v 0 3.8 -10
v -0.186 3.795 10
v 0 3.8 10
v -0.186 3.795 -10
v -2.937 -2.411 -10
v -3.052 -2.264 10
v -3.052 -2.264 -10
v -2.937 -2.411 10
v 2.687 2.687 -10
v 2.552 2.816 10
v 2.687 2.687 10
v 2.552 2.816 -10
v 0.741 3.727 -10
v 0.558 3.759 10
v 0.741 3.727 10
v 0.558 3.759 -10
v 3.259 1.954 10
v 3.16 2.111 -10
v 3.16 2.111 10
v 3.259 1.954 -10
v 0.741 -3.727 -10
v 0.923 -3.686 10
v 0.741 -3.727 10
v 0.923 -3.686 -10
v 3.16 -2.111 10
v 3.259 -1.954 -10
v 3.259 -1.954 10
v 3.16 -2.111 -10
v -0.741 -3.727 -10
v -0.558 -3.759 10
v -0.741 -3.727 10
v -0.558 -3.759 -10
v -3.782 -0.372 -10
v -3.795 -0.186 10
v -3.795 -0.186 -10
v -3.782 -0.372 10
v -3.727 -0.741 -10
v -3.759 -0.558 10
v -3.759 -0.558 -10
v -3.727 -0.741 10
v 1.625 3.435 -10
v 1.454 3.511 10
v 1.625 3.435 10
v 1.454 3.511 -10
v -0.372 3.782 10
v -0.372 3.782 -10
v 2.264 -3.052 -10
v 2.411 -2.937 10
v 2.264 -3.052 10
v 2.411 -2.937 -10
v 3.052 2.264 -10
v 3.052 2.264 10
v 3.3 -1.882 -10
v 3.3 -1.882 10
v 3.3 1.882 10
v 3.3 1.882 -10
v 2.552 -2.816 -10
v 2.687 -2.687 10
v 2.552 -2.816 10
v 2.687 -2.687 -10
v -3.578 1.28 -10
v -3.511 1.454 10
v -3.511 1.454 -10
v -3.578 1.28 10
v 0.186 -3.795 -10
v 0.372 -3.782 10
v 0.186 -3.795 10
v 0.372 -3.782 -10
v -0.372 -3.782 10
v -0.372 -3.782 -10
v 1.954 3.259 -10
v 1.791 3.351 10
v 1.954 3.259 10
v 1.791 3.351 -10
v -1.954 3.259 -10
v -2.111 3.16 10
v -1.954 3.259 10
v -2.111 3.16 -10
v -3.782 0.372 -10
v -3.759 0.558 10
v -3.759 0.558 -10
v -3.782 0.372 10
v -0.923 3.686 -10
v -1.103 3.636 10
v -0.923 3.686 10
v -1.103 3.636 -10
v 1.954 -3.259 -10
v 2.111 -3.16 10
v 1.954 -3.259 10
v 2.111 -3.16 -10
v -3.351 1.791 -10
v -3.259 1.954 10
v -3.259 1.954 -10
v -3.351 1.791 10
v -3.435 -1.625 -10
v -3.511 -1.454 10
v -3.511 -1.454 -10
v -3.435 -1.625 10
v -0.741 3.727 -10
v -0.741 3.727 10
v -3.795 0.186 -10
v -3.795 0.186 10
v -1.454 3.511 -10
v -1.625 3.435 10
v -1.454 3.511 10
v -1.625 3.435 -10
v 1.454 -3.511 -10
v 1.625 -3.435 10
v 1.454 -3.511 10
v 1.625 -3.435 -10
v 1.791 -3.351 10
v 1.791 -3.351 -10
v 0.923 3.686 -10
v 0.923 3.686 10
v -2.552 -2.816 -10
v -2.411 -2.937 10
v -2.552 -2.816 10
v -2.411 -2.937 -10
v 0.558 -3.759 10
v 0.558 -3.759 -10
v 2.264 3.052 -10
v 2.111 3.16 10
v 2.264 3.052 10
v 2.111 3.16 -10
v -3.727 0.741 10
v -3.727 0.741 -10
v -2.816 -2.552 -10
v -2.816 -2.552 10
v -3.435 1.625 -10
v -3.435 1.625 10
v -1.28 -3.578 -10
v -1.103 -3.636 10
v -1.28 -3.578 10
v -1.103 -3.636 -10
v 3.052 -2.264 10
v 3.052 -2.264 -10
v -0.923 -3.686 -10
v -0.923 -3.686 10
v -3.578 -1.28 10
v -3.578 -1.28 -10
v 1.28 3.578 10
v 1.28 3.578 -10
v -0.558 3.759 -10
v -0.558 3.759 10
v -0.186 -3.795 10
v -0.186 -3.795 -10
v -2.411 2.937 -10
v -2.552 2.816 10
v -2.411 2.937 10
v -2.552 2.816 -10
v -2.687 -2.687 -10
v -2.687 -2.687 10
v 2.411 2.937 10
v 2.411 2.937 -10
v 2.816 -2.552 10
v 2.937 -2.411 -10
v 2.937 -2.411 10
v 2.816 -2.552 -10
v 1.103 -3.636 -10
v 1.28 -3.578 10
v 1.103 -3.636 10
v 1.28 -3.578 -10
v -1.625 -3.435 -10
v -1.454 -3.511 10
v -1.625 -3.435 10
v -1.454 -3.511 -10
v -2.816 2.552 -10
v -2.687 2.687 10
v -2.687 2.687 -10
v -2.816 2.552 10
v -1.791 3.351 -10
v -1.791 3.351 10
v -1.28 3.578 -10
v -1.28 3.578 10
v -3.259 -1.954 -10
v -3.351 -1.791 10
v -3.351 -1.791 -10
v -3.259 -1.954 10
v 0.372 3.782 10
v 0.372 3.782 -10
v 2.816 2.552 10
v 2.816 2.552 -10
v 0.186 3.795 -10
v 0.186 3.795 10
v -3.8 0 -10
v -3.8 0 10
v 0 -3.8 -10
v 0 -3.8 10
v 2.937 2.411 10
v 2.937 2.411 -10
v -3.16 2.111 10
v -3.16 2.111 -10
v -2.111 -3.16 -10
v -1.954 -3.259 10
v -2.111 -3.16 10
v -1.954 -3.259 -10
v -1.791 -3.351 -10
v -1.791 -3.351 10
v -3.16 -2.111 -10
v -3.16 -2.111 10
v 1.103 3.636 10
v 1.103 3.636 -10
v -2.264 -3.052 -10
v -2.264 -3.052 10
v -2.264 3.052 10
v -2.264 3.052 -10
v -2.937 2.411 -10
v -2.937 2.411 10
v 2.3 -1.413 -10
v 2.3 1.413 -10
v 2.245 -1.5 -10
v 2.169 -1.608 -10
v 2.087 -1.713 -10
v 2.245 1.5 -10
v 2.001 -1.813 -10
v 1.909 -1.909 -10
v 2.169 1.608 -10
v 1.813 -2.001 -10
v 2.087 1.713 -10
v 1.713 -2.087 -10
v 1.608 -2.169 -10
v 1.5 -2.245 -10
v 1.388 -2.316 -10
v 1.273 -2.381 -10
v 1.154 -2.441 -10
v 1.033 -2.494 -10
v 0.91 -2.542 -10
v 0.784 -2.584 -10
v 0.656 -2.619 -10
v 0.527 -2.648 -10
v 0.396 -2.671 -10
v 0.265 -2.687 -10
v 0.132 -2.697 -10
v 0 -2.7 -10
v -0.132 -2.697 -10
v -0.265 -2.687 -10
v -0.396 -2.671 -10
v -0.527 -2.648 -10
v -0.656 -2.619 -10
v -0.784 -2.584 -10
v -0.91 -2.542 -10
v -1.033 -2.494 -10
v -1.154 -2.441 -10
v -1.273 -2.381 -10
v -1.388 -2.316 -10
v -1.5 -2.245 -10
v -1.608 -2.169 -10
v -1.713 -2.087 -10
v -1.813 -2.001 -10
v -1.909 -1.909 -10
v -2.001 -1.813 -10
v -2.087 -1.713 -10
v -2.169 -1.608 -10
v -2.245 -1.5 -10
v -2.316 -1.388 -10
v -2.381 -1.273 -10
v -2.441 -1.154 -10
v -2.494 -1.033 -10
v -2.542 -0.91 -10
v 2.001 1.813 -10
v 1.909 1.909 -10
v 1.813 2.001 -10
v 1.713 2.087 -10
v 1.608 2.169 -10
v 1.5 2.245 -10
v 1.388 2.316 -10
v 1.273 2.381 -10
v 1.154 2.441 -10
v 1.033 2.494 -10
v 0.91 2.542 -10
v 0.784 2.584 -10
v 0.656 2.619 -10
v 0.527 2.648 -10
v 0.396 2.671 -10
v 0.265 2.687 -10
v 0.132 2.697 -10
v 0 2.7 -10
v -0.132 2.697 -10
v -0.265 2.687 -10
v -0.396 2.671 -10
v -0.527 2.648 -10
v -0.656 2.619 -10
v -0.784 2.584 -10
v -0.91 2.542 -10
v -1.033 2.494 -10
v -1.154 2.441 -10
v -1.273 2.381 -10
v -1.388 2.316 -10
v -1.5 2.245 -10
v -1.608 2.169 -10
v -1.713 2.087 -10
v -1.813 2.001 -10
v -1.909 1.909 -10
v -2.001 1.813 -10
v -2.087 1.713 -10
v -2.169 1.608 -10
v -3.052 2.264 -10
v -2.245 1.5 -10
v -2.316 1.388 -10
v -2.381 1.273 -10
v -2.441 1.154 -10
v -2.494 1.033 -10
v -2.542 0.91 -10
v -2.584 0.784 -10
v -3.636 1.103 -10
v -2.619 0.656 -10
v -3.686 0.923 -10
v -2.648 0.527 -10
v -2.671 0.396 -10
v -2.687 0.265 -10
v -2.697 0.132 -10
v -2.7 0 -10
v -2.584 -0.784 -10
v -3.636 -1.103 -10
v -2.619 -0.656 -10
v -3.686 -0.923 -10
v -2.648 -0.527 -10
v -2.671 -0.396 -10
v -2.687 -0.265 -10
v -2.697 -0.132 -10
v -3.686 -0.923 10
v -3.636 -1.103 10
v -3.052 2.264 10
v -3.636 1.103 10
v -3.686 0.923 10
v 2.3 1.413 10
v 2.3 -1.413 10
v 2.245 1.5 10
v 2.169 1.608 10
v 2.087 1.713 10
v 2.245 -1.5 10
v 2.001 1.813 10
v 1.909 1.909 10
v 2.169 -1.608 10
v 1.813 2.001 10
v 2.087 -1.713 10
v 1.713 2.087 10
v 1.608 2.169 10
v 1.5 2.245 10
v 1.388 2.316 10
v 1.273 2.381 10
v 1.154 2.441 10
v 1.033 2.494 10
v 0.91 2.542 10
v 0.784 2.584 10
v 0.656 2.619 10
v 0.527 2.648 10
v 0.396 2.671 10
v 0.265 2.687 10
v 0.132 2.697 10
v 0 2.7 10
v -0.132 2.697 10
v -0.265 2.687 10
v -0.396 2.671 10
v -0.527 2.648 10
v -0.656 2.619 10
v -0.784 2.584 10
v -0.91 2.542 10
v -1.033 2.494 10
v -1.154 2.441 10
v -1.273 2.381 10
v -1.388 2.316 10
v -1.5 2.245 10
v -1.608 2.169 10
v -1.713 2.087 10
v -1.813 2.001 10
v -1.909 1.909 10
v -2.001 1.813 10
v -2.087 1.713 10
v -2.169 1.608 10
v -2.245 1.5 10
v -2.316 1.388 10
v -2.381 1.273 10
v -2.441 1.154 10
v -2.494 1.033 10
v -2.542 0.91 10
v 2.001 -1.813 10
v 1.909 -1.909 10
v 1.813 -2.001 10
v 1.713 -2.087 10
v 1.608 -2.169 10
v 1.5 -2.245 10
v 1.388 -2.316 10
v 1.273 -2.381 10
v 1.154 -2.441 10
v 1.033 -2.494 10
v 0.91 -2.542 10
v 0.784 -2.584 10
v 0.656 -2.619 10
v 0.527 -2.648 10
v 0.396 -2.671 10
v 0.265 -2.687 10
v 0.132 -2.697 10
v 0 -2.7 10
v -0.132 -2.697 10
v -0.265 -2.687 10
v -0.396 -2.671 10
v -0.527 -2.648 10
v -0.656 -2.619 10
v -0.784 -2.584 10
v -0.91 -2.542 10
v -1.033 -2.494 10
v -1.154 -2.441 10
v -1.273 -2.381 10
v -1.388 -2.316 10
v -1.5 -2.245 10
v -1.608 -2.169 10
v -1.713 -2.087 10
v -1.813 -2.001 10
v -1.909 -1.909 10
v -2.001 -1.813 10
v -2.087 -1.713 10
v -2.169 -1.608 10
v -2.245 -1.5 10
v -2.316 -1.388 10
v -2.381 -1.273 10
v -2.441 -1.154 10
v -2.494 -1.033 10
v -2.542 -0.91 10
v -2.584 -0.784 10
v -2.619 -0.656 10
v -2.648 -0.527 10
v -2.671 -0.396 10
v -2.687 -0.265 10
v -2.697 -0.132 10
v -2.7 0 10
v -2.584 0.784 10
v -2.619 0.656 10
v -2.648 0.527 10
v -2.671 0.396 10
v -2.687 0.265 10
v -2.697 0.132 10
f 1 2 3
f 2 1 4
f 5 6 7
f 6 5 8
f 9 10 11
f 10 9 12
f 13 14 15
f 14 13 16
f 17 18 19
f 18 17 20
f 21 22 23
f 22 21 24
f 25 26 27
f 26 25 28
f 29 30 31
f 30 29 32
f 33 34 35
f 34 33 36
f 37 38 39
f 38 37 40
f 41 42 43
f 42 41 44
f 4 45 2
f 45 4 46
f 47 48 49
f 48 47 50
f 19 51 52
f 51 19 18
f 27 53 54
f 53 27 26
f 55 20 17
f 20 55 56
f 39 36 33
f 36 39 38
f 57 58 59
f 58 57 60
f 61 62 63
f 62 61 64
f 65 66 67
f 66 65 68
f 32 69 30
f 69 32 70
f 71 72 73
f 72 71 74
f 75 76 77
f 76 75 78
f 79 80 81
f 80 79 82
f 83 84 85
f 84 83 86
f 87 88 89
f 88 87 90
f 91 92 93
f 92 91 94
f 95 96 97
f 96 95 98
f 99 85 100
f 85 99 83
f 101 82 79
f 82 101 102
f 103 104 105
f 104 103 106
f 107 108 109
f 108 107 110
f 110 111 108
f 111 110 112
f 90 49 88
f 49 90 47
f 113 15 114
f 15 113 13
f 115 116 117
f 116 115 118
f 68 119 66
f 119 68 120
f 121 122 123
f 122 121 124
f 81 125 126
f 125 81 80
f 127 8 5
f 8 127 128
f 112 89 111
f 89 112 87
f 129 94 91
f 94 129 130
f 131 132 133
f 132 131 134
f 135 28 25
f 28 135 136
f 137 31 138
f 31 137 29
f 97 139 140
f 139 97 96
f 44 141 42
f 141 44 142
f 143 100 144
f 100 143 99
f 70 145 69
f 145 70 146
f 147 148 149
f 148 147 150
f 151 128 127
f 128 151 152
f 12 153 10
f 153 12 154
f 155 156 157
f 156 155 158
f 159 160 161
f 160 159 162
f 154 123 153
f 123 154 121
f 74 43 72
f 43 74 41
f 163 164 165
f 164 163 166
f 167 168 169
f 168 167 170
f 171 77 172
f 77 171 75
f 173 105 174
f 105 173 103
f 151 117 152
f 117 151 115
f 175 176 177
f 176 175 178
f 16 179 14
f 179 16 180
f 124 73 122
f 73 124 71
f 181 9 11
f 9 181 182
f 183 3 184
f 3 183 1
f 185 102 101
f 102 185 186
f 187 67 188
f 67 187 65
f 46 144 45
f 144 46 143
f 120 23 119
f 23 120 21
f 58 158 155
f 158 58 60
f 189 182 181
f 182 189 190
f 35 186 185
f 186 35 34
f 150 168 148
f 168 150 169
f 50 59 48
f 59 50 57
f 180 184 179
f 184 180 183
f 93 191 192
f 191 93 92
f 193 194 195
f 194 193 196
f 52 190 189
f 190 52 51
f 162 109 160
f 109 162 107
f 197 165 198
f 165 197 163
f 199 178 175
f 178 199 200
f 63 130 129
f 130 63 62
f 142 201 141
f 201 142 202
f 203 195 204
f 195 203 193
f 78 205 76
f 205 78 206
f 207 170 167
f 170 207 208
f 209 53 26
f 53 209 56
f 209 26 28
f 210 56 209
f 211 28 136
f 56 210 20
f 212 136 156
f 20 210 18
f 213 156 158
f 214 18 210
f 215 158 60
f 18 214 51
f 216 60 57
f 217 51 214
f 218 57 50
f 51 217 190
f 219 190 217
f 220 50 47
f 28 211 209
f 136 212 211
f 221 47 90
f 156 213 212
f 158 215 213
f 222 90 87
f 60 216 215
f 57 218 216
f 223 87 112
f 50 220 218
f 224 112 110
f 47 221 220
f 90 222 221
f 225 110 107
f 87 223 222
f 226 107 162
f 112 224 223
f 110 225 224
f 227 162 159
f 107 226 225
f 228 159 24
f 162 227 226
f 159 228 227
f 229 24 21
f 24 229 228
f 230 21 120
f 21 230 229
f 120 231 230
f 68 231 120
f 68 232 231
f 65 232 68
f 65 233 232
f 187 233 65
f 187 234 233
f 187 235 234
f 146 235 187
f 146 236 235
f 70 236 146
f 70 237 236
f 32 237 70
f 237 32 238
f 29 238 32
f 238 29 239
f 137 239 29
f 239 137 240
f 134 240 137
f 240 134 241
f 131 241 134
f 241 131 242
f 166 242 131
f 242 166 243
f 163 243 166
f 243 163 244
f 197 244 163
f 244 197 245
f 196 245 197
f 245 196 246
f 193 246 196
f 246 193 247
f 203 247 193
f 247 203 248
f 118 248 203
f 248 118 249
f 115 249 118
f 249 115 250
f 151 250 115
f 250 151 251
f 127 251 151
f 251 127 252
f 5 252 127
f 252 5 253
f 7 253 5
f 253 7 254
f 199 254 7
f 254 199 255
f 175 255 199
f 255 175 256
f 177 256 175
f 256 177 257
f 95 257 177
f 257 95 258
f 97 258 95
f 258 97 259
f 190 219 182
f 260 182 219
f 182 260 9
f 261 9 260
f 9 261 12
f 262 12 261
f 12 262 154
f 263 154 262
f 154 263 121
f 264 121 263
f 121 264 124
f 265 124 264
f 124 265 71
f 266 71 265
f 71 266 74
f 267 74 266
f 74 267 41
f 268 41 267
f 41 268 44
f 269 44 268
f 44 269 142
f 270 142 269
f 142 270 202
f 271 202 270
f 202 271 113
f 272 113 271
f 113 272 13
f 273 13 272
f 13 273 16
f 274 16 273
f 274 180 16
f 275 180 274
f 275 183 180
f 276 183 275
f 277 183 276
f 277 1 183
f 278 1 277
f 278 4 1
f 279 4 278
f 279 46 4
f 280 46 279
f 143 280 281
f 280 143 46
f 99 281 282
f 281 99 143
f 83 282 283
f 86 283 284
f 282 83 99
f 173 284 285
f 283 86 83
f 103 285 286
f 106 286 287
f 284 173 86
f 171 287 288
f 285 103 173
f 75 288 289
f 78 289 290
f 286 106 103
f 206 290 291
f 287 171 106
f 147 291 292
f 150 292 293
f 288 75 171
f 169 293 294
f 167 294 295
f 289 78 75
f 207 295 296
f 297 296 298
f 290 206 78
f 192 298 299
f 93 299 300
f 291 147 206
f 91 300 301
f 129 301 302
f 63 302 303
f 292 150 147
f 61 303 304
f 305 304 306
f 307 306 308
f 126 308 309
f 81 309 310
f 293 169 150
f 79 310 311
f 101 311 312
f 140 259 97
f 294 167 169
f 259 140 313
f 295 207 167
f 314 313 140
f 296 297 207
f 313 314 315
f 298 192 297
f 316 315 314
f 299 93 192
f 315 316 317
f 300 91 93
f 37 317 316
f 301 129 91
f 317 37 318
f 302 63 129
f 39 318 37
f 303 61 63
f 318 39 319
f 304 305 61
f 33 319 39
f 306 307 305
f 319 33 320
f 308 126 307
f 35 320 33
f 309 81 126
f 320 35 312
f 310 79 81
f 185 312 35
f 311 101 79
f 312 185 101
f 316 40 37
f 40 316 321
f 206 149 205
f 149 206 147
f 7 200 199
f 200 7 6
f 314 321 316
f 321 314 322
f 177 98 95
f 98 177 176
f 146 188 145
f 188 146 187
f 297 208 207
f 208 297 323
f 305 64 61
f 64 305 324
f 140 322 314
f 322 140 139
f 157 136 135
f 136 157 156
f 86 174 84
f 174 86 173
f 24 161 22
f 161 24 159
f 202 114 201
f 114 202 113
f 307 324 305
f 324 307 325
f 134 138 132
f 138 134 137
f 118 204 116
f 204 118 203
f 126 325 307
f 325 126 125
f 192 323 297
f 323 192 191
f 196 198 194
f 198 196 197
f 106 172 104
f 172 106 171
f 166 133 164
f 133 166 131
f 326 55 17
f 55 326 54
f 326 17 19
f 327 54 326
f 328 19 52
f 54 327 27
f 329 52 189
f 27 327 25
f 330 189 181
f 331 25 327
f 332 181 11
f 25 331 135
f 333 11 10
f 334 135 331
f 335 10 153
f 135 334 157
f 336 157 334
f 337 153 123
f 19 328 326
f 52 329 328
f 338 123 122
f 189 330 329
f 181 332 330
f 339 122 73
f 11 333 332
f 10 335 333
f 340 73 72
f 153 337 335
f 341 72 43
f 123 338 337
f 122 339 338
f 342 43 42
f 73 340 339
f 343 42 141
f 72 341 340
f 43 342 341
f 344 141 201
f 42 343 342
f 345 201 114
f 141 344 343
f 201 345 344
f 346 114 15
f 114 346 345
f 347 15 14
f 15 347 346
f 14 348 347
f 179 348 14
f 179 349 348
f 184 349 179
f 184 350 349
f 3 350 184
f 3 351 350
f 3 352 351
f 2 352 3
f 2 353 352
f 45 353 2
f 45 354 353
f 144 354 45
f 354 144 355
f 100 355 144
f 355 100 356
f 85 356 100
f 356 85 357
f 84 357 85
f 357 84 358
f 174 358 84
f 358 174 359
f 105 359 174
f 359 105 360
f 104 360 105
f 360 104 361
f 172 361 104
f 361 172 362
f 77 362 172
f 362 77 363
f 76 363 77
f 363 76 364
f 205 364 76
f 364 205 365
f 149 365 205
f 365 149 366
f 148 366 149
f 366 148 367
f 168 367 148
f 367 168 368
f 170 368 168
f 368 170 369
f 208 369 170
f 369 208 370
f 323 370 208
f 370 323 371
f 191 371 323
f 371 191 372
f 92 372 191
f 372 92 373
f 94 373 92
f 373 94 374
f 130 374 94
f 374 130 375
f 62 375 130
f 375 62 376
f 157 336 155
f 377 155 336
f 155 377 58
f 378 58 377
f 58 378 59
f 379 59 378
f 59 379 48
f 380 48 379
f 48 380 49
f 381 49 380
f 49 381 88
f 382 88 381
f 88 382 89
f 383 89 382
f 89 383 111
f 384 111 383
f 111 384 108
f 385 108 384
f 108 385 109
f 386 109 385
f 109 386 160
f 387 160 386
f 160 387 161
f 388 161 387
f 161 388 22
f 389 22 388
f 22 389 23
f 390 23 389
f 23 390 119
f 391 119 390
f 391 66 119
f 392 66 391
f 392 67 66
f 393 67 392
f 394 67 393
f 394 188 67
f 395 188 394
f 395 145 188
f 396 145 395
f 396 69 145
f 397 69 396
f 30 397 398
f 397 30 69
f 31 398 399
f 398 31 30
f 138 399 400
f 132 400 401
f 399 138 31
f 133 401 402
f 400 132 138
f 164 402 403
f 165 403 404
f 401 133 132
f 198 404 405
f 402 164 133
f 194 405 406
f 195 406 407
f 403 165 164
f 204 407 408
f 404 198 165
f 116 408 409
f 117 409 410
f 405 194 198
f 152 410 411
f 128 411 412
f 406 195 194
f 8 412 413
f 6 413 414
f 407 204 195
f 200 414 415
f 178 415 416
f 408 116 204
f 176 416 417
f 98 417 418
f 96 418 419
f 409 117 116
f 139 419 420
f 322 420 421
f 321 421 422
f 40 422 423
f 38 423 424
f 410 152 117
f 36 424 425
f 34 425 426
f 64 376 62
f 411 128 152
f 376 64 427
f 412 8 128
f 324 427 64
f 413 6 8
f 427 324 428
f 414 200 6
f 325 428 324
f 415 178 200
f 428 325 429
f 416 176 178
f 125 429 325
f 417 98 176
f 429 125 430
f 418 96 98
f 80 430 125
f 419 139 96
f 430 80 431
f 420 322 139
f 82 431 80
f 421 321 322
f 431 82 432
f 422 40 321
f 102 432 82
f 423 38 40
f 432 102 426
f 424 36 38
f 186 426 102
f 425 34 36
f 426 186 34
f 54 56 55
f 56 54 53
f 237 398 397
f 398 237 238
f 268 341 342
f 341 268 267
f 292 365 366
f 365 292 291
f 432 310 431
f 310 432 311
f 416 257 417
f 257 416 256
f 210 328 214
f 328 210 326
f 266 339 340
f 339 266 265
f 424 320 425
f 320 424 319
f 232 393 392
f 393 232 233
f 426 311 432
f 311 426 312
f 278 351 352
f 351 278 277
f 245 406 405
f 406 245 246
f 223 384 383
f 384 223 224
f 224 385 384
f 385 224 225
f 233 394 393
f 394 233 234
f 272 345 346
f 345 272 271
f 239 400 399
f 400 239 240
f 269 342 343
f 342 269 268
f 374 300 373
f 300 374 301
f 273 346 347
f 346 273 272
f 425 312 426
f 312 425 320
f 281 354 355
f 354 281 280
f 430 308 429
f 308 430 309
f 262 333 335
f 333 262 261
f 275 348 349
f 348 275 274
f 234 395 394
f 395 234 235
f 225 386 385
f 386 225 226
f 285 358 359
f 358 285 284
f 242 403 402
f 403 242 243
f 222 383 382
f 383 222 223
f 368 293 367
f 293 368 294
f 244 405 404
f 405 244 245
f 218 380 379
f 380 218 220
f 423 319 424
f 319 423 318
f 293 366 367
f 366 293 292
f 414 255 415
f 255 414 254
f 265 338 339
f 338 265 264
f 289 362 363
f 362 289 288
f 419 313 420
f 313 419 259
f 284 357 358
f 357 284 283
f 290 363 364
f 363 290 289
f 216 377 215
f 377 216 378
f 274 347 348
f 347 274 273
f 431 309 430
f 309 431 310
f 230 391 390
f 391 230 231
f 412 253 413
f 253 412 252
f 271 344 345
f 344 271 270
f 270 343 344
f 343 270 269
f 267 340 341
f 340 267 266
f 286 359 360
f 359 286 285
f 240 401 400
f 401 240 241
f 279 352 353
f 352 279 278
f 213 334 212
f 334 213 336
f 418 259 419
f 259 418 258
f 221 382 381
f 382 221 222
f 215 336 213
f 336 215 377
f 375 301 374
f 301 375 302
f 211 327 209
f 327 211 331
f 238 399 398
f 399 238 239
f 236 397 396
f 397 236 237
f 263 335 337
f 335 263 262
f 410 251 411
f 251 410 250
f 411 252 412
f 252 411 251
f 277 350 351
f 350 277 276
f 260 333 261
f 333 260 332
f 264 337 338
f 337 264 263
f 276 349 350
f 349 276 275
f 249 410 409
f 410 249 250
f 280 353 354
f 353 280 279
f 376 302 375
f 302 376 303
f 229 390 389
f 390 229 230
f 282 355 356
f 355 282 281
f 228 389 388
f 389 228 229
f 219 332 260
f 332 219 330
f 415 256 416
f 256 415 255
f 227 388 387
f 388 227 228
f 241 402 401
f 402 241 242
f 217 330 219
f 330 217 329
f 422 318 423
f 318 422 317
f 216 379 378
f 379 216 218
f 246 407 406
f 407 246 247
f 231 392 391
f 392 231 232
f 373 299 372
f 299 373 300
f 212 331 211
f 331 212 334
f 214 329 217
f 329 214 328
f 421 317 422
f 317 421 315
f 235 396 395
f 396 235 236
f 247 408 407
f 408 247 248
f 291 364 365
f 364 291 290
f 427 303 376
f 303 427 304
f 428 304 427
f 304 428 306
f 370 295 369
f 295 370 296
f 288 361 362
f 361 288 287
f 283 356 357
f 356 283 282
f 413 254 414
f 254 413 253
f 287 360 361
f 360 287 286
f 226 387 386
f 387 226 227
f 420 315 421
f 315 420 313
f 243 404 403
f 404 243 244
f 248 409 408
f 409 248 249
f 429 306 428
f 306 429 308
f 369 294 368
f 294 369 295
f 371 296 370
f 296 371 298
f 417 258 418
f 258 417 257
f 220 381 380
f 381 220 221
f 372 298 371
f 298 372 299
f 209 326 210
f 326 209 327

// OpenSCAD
// file: mechanic.scad
// For mechanics only
use <base.scad>;

// Fish top with stem. Angle must be between 0 and 90.
// Female fish top - is a difference(cube, male)
// Stem - for male, Shell - for female
// Shell = [side(X), back(Y)] or scalar
module fishtop(gender = "m", size = 1, depth = 1, 
    angle = 45, length = 1, backlash = 0, stem = 0, shell = 1)
{
    if (angle >= 90 || angle <= 0) echo("Fish top: Wrong angle!");
    if (gender == "m") {
        real_size = size + 2*backlash;
        real_depth = depth + backlash;
        minor_size = size - 2*depth/tan(angle) + 2*backlash;
        union() {
            linear_extrude(height = length, center = true, scale = 1.0)
            {
                polygon(points = [[-real_size/2, backlash],
                    [-real_size/2, 0], [real_size/2, 0],
                    [real_size/2, backlash],
                    [minor_size/2, real_depth], 
                    [-minor_size/2, real_depth]]);
            }
            translate([0, real_depth + stem / 2 - 0.01, 0]) 
                cube([minor_size, stem, length], center = true);
        }
        
    } else {
        side_shell = (len(shell) > 1) ? shell[0] : shell;
        back_shell = (len(shell) > 1) ? shell[1] : shell;
        difference() {
            translate([0, depth/2 - back_shell/2, 0])
                cube([size + 2 * side_shell, 
                    depth + back_shell, length], 
                    center = true);
            fishtop(gender = "m", size = size, depth = depth, 
                angle = angle, length = length + 0.01, 
                backlash = backlash, stem = 0.1);
        }
    }
}

// Box
// You must set any two parameters. Thrid parameter is redundant.
// External, internal and shell must be a vectors.
// shell[2] (Z) - is a bottom width
module box(external = 0, internal = 0, shell = 0)
{
    ext_size = (external) ? external : internal + 
        [shell[0]*2, shell[1]*2, shell[2]];
    int_size = (internal) ? internal : external - 
        [shell[0]*2, shell[1]*2, shell[2]];
    shell_size = (shell) ? shell : 
        [(external[0] - internal[0]) / 2,
         (external[1] - internal[1]) / 2,
         external[2] - internal[2]];
    difference(){
        cube(ext_size, center = true);
        translate([0, 0, shell_size[2]/2 + 0.01])
            cube(int_size + [0, 0, 0.02], center = true);
    }
}

// Stuff for bolt and nut mount. Add it in difference
// Required parameters: l - full bolt length. d - bolt diameter, 
// Additional parameters: depth - hat and nut depth, hex - nut width, hat_d - botl hat diameter
module bolt_nut_mount(l = 10, d = 3, depth = 0, hex = 0, hat_d = 0)
{
    hat_depth = (depth == 0) ? d : depth;
    hex_depth = (depth == 0) ? d : depth;
    bolt_hat_d = (hat_d == 0) ? 2*d : hat_d;
    hex_w = (hex == 0) ? (1.7 + 5.4 / pow(d, 3)) * d : hex;
    union() {
        cylinder(d = d, h = l, center = true);
        translate([0, 0, l/2 - hat_depth/2]) cylinder(d = bolt_hat_d, h = hat_depth, center = true);
        translate([0, 0, -l/2 + hat_depth/2]) prism(h = hex_depth) hexagon(hex_w);
    }
}


// Pipe
module pipe(outer_diameter, inner_diameter, length, resolution = 0.1)
{
    $fs = resolution;
    difference() {
        cylinder(h = length, r = outer_diameter / 2, 
            center = true);
        cylinder(h = length + 0.01, r = inner_diameter / 2, 
            center = true);
    }
}

// Holder for cylinder
// n_holes - number of holes - can be scalar or [x_holes, z_holes]
module pipe_collar(cylinder_d = 10, holder_d = 5, holder_h = 10, 
    gap = 1, clamp_l = 1, clamp_w = 1, n_holes = 0, hole_d = 3, bolt_places = false)
{
    holder_shell = (holder_d - cylinder_d)/2;
    clamp_full_l = clamp_l + holder_d/2;
    hole_points_z = (len(n_holes) == undef) ? 
        [-holder_h * (n_holes/(n_holes + 1) - 1/2):
         holder_h/(n_holes + 1):
         holder_h * (n_holes/(n_holes + 1) - 1/2) + 0.01] : 
        [holder_h/2 - hole_d, -holder_h/2 + hole_d];
    difference() {
        union() {
            cylinder(r = holder_d/2, h = holder_h, center = true);
            // clamp
            translate([clamp_full_l/2, 0, 0])
                cube([clamp_full_l, clamp_w*2 + gap, holder_h], 
                    center = true);
        }
        union() {
            cylinder(r = cylinder_d/2, h = holder_h + 0.01, 
                center = true);
            // gap
            translate([holder_d/2 - (holder_shell - clamp_l)/2, 0, 0]) 
                cube([clamp_l + holder_d/2 + 0.01, gap, 
                    holder_h + 0.01], center = true);
            // holes
            for (z = hole_points_z) {
                translate([cylinder_d/2 + clamp_l/2 + holder_shell*3/4, 0, z]) 
                rotate([90, 0, 0])
                if (bolt_places) {
                    bolt_nut_mount(l = clamp_w*2 + gap + 0.01, d = hole_d);
                } else {
                    cylinder(r = hole_d/2, h = clamp_w*2 + gap + 0.01, 
                        center = true);
                }
            }
        }
    }
}

$fn = 64;
pipe_collar(cylinder_d = 16, holder_d = 20, holder_h = 10, gap = 3,
    clamp_l = 7, clamp_w = 3, n_holes = 2, hole_d = 2);
// file: base.scad
// Base function and modules for all cases

// Create [x, y, z] copies of the object 
// placed according to the step vector
module array(n_copies, step = [10,10,10], center = true)
{
    translation = (center) ? [for(i = [0:2])
            (n_copies[i] - 1) * step[i] / -2] : [0, 0, 0];
    translate(translation)
    union() {
        for (i_x = [0:n_copies[0] - 1]) {
            for (i_y = [0:n_copies[1] - 1]) {
                for (i_z = [0:n_copies[2] - 1]) {
                    translate([i_x*step[0], i_y*step[1], 
                        i_z*step[2]]) children();
                }
            }
        }
    }
}

module mirrorcp(arg) {
    children();
    mirror(arg) children();
}

module rotatecp(arg) {
    children();
    rotate(arg) children();
}

module placeclone(points) {
    union() {
        for (p = points) {
            translate(p) children();
        }
    } 
}

// cylinder with ellipse profile
module ellipse_cylinder(h = 1, rx = 1, ry = 1)
{
    scale([rx, ry, h]) cylinder(h = 1, r = 1, center = true);
}

// rectangular triangle
module rect_triangle(x = 1, y = 1)
{
    polygon(points = [[x, 0], [0, 0], [0, y]]);
}

// isosceles triangle
// set two out of three parameters
module iso_triangle(base = undef, height = undef, angle = undef)
{
    b = (base > 0) ? base : 2 * height / tan(angle);
    h = (height > 0) ? height : base * tan(angle) / 2;
    a = (angle > 0) ? angle : atan2(h, b/2);
    polygon(points = [[-b/2, 0], [0, h], [b/2, 0]]); 
}

// hexagon. Width for nut wrench.
module hexagon(width)
{
    size = width / sqrt(3);
    polygon(points = [for(a = [0:60:360]) [size*cos(a+30), size*sin(a+30)]]);
}

// octogon. Width - from rib to rib
module octogon(width)
{
    size = 0.5 * width / cos(45/2);
    polygon(points = [for(a = [0:45:360]) [size*cos(a+45/2), size*sin(a+45/2)]]);
}

// torus(outer_d, inner_d)
module torus(outer_d, inner_d, convexity = 10)
{
    rotate_extrude(convexity = convexity)
    translate([outer_d/2, 0, 0])
    circle(d = inner_d);
}

// isosceles trapezium
// set three out of four parameters
module iso_trapezium(bottom = undef, top = undef, height = undef, angle = undef)
{
    b = (bottom > 0) ? bottom : top + 2 * height / tan(angle);
    t = (top > 0) ? top : bottom - 2 * height / tan(angle);
    h = (height > 0) ? height : abs(bottom - top) * tan(angle) / 2;
    a = (angle > 0) ? angle : atan2(h, abs(bottom - top) / 2);
    polygon(points = [[-b/2, 0], [-t/2, h], [t/2, h], [b/2, 0]]);
}

// create prism from polygon
module prism(h = 1, center = true)
{
    linear_extrude(height = h, center = center, scale = 1.0)
    {
        children();
    }
}


// rectangular triangle prism
// size = [x, y, z] - 2 legs and depth
// dir - direction of normal to triangle plane
module rect_triangle_prism(size = [1, 1, 1])
{
    linear_extrude(height = size[2], center = true, scale = 1.0)
    {
        rect_triangle(x = size[0], y = size[1]);
    }
}

// Circular plane sector
// angle > 0!
module sector2d(diameter, angle)
{
    support_point = (angle < 90) ? [0, 2*diameter] :
                    (angle < 270) ? [-2*diameter, 0] :
                    [0, -2*diameter];
    difference() {
        circle(d=diameter);
        polygon(points = [[0, 0], [2*diameter, 0], [2*diameter, -3*diameter], 
            [-4*diameter, -3*diameter], support_point,
            [diameter*cos(angle), diameter*sin(angle)]]);
        
    }
}

// Bow - base on sector2d
// Pos - bow position related to diameter. Can be "o" = outer, "i" = inner, "c" = center
module bow2d(diameter, angle, width, pos = "c")
{
    d_offset = (pos == "o") ? width : (pos == "i") ? -width : 0;
    d1 = diameter + width + d_offset;
    d2 = d1 - 2*width;
    difference() {
        sector2d(d1, angle);
        sector2d(d2, 360);
    }
}

// Bow - bow2d by two points - beginning and ending of bow.
// Pos - bow position related to points. Can be "o" = outer, "i" = inner, "c" = center
// Use switch to choose another bow part
module bow2d2p(point_begin, point_end, bow_r, width, switch = true, pos = "c", ext_angle = 0)
{
    dx = point_begin[0];
    dy = point_end[1];
    circle_center = [circle_center_x(point_end[0] - dx, point_begin[1] - dy, bow_r), circle_center_y(point_end[0] - dx, point_begin[1] - dy, bow_r)] + [dx, dy];
    az_begin = vector_az2d(point_begin - circle_center);
    az_end = vector_az2d(point_end - circle_center);
    az1 = (switch) ? min(az_begin, az_end) : max(az_begin, az_end);
    az2 = (switch) ? max(az_begin, az_end) : min(az_begin, az_end);
    bow_a = (az2 > az1) ? az2-az1: 360 + (az2 - az1);
    echo(az1 = az1); echo(dx = dx); echo(dy = dy);
    echo(az2 = az2); echo(az_begin = az_begin); echo(az_end = az_end);
    echo(circle_center = circle_center);

    translate([circle_center[0], circle_center[1], 0])
    rotate([0, 0, az1 - ext_angle])
    bow2d(abs(bow_r)*2, bow_a + 2*ext_angle, width, pos);
}

function vector_az2d(v) = atan2(v[1], v[0]);

function rotate_vector(a, v)
    = [[1,0,0],[0,cos(a[0]),-sin(a[0])],[0,sin(a[0]),cos(a[0])]]
    * [[cos(a[1]),0,sin(a[1])],[0,1,0],[-sin(a[1]),0,cos(a[1])]]
    * [[cos(a[2]),-sin(a[2]),0],[sin(a[2]),cos(a[2]),0],[0,0,1]] * v;

function circle_center_root(x, y, r) = sign(r) * sqrt(pow(r,2) / (pow(y,2) + pow(x,2)) - 0.25);
function circle_center_x(x, y, r) = y * circle_center_root(x, y, r) + x/2;
function circle_center_y(x, y, r) = x * circle_center_root(x, y, r) + y/2;


module bevel_cube(cube_vec, bevel)
{
    intersection() {
        intersection() {
            intersection() {
                cube(cube_vec, center = true);
                scale([1, cube_vec[1]/cube_vec[0],1])
                cylinder(d=cube_vec[0]*sqrt(2)-bevel*2, h = cube_vec[2]+1,center=true);
            }
            rotate([90,0,0])
            scale([1, cube_vec[2]/cube_vec[0],1])
            cylinder(d=cube_vec[0]*sqrt(2)-bevel*2, h = cube_vec[1]+1,center=true);
        }
        rotate([0,90,0])
        scale([1, cube_vec[2]/cube_vec[1],1])
        cylinder(d=cube_vec[1]*sqrt(2)-bevel*2, h = cube_vec[0]+1,center=true);
    }
}
// main file
use <base.scad>;
use <mechanic.scad>;

// place for bearing
module bearingplace(outer_diameter, inner_diameter, height, 
    shaft = 100, shaft_offset = 0.0, backlash = 0.1, resolution = 0.1, center = true)
{
    $fs = resolution;
    union() {
        cylinder(h = height + 2 * backlash, 
            r = backlash + outer_diameter / 2, 
            center = center);
        translate([0, 0, shaft_offset]) cylinder(h = shaft, 
            r = backlash + inner_diameter / 2, 
            center = center);
    }
    
} 

// Shaft
module shaft(diameter, length = 100, backlash = 0.1, resolution = 0.1, dir = "z", pos = [0, 0, 0])
{
    angle = (dir == "x") ? [0, 90, 0]:
            (dir == "y") ? [90, 0, 0]:
            [0, 0, 0];
    translate(pos) rotate(angle)
        cylinder(h = length, r = backlash + diameter / 2, center = true, $fs = resolution);
}

// Truncated shaft like motor shaft
// Trunc parameter - truncation depth
module truncated_shaft(diameter, trunc_depth, length = 1, backlash = 0.1, dir = "z", pos = [0, 0, 0])
{
    angle = (dir == "x") ? [0, 90, 0]:
            (dir == "y") ? [90, 0, 0]:
            [0, 0, 0];
    real_trunc_depth = trunc_depth;
    translate(pos) rotate(angle)
        difference() {
            cylinder(h = length, r = backlash + diameter / 2, center = true);
            translate([backlash + diameter / 2, 0, 0])
            cube([real_trunc_depth * 2, diameter + 2*backlash, length + 0.01], center = true);
        }
}

// Shaft to shaft adapter. Support truncated shafts
// backlash = [inner_shaft_backlash, outer_shaft_backlash]
// trunc = [trunc_depth_inner, trunc_depth_outer]
module shaft2shaft(inner_diameter, outer_diameter, length = 1, trunc = [0, 0], backlash = [0.1, 0.1], dir = "z", pos = [0, 0, 0])
{
        difference() {
            truncated_shaft(outer_diameter, trunc[1], length = length, backlash = -backlash[1], dir = dir, pos = pos);
            truncated_shaft(inner_diameter, trunc[0], length = length + 0.01, backlash = backlash[0], dir = dir, pos = pos);
        }
}

// Place hole and holder for shaft
// mirrorcp = "xyz", type dimensions for mirrorcp
module add_shaftholder(diameter, shell, dir = "z", backlash = 0.1, mirrorcp = "", pos = [0, 0, 0], length = 10)
{
    mirrorcp_x = 0;

    difference() {
        union() {
            children();

            shaft(diameter + 2 * shell, length = length, dir = dir, backlash = 0, pos = pos);
        }
    }
}
$fn = 128;
shaft2shaft(5, 8, length = 20, trunc = [0.4, 0.5], backlash = [0.2, 0.2]);
